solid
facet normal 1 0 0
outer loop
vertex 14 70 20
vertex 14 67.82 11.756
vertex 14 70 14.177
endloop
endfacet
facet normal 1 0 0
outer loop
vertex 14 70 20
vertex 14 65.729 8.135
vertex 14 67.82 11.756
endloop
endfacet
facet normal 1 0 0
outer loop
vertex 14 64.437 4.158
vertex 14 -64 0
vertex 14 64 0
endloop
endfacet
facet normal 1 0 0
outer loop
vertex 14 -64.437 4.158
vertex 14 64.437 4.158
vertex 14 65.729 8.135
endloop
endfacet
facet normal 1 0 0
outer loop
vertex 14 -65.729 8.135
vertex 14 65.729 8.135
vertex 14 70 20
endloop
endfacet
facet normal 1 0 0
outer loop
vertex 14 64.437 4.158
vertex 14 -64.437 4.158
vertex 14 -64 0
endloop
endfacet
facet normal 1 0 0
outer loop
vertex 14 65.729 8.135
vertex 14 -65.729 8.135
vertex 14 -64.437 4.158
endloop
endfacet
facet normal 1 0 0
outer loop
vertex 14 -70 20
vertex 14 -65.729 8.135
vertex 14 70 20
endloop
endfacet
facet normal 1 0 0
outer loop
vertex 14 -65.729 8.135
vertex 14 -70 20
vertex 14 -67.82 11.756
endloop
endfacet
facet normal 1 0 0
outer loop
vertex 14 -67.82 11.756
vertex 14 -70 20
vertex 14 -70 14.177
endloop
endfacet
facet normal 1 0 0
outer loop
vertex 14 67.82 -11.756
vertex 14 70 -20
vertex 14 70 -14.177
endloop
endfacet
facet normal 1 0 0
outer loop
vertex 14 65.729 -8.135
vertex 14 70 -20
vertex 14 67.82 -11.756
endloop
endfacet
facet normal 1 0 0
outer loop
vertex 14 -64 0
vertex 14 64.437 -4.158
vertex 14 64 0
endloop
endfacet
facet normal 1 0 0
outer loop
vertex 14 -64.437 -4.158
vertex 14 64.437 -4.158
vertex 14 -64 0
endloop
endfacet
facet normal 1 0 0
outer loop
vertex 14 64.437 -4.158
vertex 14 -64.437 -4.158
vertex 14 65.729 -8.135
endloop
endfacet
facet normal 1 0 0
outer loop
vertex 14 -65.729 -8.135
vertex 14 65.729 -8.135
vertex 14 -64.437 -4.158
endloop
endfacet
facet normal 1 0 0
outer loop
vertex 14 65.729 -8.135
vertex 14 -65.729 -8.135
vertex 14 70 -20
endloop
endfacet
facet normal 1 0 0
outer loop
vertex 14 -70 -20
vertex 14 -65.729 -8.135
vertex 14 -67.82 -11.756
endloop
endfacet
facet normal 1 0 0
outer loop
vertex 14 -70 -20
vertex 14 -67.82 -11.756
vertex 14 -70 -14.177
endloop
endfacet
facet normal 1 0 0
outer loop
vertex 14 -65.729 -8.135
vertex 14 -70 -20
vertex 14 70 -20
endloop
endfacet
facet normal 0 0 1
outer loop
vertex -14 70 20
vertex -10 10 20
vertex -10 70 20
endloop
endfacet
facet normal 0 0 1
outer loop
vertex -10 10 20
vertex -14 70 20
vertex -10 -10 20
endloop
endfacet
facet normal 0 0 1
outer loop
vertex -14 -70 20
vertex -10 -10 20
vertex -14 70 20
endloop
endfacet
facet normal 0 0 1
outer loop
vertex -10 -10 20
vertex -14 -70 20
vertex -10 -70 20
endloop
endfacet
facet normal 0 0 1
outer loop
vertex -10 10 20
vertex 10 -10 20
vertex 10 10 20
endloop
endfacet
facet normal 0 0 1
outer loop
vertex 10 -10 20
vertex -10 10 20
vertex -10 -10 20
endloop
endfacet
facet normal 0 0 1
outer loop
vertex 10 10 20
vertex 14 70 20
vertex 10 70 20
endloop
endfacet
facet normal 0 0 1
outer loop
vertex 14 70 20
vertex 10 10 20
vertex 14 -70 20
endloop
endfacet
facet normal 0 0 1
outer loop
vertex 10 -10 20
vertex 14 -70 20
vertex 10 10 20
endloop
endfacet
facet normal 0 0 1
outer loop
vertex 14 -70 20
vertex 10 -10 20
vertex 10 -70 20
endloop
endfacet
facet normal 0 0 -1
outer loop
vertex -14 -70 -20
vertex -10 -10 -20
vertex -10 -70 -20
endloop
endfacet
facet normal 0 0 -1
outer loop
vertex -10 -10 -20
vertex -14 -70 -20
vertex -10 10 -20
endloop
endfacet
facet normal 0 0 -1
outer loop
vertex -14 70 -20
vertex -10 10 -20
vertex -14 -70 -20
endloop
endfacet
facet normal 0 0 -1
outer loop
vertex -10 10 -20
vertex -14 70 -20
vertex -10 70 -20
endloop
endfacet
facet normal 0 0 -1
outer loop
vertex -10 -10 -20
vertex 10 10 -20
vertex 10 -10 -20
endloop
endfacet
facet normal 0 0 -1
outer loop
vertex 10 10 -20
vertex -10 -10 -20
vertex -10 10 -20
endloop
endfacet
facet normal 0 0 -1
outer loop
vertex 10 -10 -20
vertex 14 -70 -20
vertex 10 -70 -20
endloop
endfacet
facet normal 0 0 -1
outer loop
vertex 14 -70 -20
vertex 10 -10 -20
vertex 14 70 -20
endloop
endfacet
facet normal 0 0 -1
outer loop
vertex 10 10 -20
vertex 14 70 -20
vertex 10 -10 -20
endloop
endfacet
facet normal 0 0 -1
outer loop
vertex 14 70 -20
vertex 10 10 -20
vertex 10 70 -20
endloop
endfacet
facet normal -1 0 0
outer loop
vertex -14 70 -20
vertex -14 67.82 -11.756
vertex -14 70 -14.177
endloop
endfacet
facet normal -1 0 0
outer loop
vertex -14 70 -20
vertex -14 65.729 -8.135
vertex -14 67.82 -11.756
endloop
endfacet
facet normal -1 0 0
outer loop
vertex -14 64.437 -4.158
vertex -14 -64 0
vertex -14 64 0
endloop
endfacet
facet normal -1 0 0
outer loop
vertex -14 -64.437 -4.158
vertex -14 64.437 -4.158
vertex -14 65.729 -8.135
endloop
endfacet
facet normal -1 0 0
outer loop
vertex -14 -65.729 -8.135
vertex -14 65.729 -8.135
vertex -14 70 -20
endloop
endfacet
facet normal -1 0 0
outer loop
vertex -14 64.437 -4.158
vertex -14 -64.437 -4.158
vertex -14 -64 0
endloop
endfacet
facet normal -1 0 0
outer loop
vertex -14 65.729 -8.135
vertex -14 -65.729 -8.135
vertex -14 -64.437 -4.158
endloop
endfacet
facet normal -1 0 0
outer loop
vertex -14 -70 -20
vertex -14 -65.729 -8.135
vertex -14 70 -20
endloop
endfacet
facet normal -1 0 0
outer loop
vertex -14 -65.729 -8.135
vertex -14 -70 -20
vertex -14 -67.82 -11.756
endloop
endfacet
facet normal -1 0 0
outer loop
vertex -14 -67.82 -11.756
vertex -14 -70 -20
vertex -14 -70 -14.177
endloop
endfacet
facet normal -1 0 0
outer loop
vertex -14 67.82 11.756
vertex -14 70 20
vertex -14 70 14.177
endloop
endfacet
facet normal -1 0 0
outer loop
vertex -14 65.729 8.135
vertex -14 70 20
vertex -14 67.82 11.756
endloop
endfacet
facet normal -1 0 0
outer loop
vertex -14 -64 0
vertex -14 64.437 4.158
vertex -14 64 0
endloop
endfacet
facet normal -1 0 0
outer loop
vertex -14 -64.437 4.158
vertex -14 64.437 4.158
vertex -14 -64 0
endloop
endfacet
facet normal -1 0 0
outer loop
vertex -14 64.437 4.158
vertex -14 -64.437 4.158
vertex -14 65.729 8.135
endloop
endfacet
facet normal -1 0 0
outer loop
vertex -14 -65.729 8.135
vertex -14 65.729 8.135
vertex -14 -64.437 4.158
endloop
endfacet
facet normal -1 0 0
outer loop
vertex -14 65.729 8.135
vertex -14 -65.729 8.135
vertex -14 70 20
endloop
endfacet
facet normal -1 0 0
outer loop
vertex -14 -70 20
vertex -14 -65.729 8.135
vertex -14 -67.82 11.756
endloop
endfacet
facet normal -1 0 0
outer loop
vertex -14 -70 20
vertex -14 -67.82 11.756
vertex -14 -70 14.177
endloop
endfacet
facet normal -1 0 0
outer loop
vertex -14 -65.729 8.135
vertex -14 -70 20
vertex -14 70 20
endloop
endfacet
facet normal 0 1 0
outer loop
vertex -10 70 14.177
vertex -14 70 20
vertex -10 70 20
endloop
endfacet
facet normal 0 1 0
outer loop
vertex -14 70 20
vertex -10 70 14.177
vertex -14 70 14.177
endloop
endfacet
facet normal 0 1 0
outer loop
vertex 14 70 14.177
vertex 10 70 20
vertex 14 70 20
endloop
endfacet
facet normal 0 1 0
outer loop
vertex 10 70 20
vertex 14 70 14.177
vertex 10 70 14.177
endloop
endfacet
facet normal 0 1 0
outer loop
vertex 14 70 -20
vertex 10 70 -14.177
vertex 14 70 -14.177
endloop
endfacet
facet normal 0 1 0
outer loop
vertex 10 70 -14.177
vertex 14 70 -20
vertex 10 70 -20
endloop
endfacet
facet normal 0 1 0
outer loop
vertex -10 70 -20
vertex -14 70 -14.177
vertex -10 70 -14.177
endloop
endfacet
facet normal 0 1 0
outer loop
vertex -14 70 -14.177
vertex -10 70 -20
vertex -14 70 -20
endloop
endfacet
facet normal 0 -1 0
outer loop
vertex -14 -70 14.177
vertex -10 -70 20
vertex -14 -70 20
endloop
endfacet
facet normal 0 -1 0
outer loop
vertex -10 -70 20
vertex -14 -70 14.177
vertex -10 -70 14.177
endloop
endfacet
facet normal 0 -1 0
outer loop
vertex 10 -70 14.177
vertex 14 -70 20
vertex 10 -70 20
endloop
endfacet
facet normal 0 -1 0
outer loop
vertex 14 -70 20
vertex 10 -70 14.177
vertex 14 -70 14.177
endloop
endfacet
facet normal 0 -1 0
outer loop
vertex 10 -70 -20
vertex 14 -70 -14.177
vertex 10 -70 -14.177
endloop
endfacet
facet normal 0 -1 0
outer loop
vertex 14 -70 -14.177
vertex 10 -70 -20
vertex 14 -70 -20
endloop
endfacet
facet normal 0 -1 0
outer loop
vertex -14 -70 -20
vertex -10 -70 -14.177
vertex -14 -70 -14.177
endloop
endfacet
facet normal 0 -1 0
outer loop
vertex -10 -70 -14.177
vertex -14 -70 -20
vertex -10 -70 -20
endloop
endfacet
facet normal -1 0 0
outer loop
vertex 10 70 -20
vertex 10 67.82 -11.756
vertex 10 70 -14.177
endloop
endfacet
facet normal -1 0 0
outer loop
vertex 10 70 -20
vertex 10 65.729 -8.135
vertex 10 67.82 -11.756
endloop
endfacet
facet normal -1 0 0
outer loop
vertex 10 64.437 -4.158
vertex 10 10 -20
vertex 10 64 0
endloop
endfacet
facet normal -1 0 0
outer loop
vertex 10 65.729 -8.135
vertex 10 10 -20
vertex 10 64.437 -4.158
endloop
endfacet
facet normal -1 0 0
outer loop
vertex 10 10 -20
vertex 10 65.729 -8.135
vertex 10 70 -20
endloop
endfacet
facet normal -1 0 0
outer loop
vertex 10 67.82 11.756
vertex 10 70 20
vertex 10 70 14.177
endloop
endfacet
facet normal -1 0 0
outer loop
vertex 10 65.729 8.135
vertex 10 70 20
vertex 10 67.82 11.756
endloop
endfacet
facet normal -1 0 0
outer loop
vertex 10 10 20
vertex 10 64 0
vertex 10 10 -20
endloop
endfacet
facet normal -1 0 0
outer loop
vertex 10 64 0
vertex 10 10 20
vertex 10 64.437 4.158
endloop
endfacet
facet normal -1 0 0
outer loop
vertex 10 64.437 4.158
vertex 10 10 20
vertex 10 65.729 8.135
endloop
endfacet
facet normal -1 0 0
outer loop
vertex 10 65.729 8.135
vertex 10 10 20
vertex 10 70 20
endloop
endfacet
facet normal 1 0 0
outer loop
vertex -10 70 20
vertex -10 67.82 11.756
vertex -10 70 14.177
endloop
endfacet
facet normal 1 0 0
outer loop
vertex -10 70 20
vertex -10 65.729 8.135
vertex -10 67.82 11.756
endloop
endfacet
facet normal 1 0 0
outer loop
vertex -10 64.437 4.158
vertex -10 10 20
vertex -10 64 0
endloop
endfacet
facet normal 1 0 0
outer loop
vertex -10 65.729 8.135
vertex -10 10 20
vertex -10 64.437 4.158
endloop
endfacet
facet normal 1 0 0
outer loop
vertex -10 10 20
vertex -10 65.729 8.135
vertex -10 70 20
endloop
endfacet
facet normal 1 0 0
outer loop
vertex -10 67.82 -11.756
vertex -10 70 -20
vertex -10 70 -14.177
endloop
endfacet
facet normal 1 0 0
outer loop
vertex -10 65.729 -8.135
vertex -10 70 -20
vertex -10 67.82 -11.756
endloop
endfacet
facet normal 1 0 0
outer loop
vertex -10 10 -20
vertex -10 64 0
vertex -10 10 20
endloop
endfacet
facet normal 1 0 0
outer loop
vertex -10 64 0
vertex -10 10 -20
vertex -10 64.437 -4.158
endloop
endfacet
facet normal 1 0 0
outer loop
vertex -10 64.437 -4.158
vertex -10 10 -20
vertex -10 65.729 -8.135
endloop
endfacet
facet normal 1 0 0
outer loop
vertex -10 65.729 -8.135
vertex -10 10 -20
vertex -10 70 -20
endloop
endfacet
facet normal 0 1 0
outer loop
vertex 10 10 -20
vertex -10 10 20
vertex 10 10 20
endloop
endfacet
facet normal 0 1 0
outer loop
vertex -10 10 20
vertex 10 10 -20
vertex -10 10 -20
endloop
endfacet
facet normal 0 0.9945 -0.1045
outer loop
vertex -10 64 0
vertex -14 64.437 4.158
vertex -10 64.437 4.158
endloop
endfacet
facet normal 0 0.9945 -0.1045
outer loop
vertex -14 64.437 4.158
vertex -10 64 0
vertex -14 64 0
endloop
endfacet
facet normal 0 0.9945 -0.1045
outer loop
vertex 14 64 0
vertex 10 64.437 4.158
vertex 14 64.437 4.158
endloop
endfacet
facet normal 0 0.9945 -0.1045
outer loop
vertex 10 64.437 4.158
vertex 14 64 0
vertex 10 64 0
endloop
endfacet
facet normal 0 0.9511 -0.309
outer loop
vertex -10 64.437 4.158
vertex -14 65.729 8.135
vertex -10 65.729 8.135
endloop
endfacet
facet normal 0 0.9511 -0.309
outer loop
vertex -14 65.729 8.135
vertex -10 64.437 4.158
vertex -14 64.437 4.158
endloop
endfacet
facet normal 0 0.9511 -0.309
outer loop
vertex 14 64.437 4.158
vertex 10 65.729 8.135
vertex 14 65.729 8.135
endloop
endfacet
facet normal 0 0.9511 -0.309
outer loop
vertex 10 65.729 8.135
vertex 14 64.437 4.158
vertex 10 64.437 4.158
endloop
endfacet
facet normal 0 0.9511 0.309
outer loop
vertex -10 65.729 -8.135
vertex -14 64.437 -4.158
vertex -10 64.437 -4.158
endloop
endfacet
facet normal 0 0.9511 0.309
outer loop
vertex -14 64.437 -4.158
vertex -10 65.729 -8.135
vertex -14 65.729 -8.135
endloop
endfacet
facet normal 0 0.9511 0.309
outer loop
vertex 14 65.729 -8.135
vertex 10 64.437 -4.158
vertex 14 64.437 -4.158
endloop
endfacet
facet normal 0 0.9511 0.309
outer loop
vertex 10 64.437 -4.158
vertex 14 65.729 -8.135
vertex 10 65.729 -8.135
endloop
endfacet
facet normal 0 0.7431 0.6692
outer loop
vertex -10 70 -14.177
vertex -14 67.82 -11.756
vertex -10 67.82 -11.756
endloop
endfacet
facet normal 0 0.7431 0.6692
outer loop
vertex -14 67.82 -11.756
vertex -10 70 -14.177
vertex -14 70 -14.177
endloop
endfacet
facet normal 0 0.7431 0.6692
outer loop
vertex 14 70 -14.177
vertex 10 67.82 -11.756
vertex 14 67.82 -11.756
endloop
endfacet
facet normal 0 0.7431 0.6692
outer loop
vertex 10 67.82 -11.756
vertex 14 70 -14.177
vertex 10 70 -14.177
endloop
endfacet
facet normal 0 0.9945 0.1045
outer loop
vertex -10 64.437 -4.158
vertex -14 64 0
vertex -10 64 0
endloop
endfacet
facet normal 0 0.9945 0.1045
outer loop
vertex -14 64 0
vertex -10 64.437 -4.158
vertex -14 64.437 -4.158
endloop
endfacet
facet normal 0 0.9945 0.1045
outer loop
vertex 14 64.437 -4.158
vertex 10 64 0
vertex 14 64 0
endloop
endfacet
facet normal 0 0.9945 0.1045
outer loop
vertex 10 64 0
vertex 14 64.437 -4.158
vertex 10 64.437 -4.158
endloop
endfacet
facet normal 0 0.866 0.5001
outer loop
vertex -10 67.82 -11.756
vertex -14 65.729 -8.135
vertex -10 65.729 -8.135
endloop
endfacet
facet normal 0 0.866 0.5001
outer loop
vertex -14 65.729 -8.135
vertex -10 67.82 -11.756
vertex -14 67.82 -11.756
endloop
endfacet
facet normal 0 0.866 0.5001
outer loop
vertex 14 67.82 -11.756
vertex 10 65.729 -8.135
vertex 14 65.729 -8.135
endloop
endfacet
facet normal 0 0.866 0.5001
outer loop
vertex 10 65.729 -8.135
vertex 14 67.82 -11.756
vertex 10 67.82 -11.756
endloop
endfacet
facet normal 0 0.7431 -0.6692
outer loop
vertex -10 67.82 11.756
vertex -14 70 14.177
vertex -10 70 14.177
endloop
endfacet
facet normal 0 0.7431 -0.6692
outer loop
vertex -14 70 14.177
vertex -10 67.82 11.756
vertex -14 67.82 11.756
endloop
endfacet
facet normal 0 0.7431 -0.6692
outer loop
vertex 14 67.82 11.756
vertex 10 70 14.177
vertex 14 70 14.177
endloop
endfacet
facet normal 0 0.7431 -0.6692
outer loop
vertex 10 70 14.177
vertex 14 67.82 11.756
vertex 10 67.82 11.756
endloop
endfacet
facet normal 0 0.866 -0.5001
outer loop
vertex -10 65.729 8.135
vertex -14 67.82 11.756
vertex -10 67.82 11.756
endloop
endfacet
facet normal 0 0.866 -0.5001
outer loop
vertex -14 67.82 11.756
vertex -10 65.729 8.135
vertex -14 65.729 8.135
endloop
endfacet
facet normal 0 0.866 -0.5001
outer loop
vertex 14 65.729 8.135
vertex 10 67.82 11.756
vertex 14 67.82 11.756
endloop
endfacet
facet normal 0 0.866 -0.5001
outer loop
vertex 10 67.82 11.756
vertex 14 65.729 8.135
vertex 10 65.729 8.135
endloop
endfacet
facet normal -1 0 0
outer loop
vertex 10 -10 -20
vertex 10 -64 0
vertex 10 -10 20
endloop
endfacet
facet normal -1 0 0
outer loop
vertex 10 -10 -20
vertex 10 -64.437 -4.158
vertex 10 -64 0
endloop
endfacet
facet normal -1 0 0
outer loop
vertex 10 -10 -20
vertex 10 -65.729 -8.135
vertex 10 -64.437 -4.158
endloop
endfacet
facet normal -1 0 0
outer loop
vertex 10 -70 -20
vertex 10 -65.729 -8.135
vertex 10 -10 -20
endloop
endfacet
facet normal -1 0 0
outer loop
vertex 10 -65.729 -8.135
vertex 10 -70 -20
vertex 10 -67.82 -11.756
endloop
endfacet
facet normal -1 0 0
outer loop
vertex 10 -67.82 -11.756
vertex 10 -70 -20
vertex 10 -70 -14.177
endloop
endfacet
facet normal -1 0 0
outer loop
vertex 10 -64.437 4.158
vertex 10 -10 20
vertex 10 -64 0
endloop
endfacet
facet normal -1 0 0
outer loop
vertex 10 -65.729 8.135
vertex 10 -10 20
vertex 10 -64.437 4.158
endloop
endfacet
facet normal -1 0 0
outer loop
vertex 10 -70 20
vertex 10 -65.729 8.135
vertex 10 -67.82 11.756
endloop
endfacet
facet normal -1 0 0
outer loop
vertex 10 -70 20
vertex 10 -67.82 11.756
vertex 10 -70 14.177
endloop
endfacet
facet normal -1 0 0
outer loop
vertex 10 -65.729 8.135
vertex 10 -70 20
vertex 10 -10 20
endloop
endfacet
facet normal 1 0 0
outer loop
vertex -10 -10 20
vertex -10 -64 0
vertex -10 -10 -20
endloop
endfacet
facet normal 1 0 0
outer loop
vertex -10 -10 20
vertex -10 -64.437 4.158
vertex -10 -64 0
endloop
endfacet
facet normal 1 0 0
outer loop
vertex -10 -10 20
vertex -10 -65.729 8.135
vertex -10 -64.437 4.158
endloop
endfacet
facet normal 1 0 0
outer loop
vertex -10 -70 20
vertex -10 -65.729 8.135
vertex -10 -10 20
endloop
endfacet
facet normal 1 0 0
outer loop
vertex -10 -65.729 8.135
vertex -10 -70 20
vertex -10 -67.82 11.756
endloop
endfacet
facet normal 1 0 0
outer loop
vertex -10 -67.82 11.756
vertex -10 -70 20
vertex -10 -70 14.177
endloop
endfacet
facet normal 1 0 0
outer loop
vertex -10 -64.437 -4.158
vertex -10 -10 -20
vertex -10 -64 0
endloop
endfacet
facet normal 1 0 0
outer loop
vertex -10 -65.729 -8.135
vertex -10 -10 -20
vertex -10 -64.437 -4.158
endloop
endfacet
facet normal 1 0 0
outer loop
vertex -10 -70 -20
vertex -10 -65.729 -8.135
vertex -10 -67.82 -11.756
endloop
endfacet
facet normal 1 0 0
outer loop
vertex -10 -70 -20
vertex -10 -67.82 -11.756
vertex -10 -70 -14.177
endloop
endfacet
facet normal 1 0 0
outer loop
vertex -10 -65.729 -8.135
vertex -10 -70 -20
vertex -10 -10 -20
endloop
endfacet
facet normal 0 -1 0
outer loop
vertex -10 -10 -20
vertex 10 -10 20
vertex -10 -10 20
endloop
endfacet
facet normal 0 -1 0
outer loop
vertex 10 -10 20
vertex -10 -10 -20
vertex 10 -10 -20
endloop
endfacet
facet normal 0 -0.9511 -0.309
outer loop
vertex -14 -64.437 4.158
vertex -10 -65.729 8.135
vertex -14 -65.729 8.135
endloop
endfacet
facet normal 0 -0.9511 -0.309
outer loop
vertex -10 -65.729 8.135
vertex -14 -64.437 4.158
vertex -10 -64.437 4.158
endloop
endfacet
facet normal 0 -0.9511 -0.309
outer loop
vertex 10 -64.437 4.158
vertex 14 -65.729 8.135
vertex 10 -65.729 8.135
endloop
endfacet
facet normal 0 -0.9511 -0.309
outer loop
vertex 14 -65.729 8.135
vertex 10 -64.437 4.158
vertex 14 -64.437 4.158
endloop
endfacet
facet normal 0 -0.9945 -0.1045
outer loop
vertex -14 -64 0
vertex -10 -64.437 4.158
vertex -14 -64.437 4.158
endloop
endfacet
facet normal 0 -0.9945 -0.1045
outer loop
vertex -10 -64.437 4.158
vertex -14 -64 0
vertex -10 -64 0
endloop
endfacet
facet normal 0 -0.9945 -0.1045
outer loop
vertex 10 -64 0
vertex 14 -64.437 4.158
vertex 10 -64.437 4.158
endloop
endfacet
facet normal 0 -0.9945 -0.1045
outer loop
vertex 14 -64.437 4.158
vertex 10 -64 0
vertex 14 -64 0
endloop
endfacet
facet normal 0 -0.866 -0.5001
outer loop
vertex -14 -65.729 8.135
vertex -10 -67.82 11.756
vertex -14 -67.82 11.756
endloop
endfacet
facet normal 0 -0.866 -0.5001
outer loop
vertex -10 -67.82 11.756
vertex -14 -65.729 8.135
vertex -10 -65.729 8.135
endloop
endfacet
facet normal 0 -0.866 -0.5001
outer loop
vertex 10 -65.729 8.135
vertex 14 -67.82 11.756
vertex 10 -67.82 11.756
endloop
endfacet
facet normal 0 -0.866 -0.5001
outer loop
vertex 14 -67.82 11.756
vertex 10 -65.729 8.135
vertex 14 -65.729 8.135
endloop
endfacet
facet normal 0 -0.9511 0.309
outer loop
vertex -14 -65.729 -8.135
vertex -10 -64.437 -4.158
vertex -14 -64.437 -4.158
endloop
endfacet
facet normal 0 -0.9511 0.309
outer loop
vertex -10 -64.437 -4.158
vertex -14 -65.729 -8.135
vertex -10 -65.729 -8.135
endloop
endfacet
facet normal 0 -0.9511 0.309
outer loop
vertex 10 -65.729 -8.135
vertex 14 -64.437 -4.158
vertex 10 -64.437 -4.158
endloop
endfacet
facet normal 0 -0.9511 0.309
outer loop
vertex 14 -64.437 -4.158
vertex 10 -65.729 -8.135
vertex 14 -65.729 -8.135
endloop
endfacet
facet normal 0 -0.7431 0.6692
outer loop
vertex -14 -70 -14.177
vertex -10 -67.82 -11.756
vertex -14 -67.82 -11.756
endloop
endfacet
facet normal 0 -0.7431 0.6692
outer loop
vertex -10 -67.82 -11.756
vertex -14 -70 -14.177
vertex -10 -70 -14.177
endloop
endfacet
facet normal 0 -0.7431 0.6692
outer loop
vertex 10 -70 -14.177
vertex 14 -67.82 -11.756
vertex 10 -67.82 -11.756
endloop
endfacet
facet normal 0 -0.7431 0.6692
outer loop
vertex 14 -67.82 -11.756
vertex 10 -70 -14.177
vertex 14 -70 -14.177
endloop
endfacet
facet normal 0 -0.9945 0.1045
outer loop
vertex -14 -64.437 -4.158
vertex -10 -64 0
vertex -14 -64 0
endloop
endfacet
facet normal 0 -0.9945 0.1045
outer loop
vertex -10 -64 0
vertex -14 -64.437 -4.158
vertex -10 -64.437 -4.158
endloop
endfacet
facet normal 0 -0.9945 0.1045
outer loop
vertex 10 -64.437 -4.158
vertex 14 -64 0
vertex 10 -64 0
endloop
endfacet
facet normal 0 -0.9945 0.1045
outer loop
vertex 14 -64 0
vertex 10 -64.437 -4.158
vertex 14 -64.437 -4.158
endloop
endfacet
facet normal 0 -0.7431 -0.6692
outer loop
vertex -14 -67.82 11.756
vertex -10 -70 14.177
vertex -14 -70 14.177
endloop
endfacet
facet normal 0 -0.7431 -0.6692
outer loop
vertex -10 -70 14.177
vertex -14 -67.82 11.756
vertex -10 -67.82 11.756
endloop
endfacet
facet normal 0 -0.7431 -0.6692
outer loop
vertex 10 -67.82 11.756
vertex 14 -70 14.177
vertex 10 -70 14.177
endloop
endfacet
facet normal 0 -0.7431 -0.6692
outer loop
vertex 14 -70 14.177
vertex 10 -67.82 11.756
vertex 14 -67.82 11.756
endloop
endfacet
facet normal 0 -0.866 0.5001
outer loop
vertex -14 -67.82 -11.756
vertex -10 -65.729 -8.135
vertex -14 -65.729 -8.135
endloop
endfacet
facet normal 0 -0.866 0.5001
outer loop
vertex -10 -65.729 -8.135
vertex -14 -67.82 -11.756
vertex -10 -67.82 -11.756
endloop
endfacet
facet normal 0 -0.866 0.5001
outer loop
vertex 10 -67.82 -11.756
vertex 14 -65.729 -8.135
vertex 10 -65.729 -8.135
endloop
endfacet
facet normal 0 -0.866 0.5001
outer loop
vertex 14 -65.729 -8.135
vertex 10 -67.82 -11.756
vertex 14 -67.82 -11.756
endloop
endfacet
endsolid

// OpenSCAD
// many melltorp connector no.2
// in mm

// The space between the tables (for cables)
gutter = 20;

height = 40;

// wall thickness
thickness = 4;

/* [Hidden] */
leg_width = 20;
leg_depth = 60;

depth = 2 * leg_depth + gutter;
width = leg_width + 2 * thickness;

difference() {
    cube( [ width, depth, height], center=true );

    translate( [0, (leg_depth+gutter) / 2, 0] )
      cube( [ leg_width, leg_depth, height ], center=true );
    translate([0,(depth/2)+height*0.35,0])
        rotate([90,0,90])
            cylinder(r=height/2,40, center = true);

    
    translate( [0, -(leg_depth+gutter) / 2, 0] )
      cube( [ leg_width, leg_depth, height ], center=true );
    translate([0,-(depth/2)-height*0.35,0])
        rotate([90,0,90])
            cylinder(r=height/2,40, center = true);



}
